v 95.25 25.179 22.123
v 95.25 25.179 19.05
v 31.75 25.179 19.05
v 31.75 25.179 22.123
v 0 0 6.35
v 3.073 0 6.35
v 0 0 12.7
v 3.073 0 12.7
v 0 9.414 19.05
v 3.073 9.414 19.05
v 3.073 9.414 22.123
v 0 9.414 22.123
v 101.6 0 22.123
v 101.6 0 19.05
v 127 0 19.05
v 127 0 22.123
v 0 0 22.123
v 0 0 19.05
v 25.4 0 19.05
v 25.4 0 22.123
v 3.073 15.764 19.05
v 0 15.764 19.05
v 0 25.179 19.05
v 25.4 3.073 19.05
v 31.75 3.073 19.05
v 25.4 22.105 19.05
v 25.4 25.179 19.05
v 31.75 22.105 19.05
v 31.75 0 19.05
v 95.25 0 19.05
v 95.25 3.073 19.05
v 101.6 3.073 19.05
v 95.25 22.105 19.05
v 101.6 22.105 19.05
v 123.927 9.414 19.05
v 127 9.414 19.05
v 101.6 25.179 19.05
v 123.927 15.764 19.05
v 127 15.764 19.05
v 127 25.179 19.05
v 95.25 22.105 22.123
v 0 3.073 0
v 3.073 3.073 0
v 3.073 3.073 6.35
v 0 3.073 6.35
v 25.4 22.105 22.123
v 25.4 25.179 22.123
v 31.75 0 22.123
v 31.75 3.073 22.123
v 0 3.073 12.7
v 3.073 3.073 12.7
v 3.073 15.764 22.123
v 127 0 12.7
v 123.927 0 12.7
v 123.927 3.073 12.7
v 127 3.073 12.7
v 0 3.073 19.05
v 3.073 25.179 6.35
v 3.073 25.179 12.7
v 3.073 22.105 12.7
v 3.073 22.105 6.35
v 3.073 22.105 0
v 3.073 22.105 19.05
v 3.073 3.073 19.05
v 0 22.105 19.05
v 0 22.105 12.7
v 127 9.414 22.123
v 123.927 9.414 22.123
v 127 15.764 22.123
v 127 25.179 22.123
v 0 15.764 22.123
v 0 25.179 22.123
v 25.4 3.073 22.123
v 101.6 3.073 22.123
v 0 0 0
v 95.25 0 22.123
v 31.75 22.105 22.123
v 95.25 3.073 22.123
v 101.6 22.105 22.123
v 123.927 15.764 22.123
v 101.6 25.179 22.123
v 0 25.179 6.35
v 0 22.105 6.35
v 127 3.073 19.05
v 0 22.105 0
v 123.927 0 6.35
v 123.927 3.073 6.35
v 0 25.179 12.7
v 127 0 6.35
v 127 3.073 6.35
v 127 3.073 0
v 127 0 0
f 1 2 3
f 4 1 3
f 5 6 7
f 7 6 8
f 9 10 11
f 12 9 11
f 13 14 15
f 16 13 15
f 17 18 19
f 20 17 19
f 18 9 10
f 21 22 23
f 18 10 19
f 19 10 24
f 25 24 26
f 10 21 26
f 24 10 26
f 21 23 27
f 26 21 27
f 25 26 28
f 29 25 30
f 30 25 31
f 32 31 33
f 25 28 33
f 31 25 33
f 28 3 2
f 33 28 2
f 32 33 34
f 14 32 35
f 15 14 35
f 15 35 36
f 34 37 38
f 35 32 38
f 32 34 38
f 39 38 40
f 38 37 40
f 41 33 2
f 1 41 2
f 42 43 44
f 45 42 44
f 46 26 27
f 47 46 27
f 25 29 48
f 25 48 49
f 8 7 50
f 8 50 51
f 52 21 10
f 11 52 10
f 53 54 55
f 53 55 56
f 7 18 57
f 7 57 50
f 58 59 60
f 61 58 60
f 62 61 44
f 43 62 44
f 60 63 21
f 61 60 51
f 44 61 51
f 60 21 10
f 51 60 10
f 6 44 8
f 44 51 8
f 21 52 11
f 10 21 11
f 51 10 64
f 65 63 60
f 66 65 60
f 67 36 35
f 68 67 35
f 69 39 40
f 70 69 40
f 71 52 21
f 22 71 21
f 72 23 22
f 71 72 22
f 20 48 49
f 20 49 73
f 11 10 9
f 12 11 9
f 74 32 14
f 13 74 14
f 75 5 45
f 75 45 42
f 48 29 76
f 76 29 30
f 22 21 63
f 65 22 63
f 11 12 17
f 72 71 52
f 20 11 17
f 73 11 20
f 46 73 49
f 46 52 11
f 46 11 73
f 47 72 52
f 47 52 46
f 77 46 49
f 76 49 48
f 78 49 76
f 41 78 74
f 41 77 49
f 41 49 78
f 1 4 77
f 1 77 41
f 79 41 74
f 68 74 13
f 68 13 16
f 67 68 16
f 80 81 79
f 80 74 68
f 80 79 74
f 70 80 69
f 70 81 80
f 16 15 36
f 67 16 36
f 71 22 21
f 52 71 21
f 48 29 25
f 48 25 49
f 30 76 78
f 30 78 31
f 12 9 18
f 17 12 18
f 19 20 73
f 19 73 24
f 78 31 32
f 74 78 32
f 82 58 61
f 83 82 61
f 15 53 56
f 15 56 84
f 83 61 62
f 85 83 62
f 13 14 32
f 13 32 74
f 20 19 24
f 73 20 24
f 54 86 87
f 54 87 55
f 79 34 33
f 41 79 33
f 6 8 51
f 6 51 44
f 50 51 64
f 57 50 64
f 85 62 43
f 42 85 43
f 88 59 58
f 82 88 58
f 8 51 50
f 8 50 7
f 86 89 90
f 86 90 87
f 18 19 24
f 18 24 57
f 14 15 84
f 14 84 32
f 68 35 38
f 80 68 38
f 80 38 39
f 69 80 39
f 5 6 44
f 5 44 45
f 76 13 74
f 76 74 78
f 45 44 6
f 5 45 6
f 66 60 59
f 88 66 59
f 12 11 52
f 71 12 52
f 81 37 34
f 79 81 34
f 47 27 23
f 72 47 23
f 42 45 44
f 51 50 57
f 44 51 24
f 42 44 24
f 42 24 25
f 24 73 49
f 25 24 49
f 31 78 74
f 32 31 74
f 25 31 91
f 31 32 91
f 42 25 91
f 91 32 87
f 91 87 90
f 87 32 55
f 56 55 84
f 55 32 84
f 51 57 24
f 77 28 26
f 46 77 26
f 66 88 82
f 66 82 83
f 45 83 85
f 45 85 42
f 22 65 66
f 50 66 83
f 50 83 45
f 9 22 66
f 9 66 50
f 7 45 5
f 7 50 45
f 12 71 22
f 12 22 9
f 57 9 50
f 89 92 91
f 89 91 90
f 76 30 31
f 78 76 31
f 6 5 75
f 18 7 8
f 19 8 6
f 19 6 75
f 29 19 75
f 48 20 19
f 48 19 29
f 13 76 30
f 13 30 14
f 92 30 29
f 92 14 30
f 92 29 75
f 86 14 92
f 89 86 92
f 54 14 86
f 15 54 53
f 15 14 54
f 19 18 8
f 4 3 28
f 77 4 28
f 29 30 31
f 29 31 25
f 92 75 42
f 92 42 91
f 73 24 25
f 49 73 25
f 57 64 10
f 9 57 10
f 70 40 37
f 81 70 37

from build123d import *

# Parameters (mm, degrees)
F2_DEPTH = 3.0734
F3_W     = 63.5
F3_H     = 3.0734
F4_DEPTH = 3.0734
F5_W     = 3.0734
F5_H     = 6.35
F6_DEPTH = 3.0734


# Not quite as in the source:
# - a variable given as a bare number and used for a length is read in inches; the dataset says mm whatever the document's units were


with BuildPart() as f2:
    # F1 (on Front) → F2 (new body)
    with BuildSketch(Plane.XZ):
        Polygon((0, 6.35), (0, 0), (127, 0), (127, 6.35), (123.9266, 6.35), (123.9266, 12.7), (127, 12.7), (127, 19.05), (101.6, 19.05), (101.6, 22.1234), (95.25, 22.1234), (95.25, 19.05), (31.75, 19.05), (31.75, 22.1234), (25.4, 22.1234), (25.4, 19.05), (0, 19.05), (0, 12.7), (3.0734, 12.7), (3.0734, 6.35), align=None)
    extrude(amount=-F2_DEPTH)


with BuildPart() as f4:
    # F3 (on face) → F4 (new body)
    with BuildSketch(Plane.XY.offset(19.05)):
        Polygon((0, 0), (25.4, 0), (25.4, 3.0734), (31.75, 3.0734), (95.25, 3.0734), (101.6, 3.0734), (101.6, 0), (127, 0), (127, 9.414411702), (123.9266, 9.414411702), (123.9266, 15.764411702), (127, 15.764411702), (127, 25.178823404), (101.6, 25.178823404), (101.6, 22.105423404), (95.25, 22.105423404), (95.25, 25.178823404), (31.75, 25.178823404), (31.75, 22.105423404), (25.4, 22.105423404), (25.4, 25.178823404), (0, 25.178823404), (0, 15.764411702), (3.0734, 15.764411702), (3.0734, 9.414411702), (0, 9.414411702), align=None)
        with Locations((63.5, 1.5367)):
            Rectangle(F3_W, F3_H)
    extrude(amount=F4_DEPTH)


with BuildPart() as f6:
    # F5 (on face) → F6 (new body)
    with BuildSketch(Plane(origin=(3.0734, 0, 0), x_dir=(0, -1, 0), z_dir=(-1, 0, 0))):
        Polygon((-3.0734, 0), (-3.0734, 6.35), (-3.0734, 12.7), (-3.0734, 19.05), (-9.414411702, 19.05), (-9.414411702, 22.1234), (-15.764411702, 22.1234), (-15.764411702, 19.05), (-22.105423404, 19.05), (-22.105423404, 12.7), (-25.178823404, 12.7), (-25.178823404, 6.35), (-22.105423404, 6.35), (-22.105423404, 0), align=None)
        with Locations((-1.5367, 9.525)):
            Rectangle(F5_W, F5_H)
    extrude(amount=F6_DEPTH)


solid = Compound([f2.part, f4.part, f6.part])
